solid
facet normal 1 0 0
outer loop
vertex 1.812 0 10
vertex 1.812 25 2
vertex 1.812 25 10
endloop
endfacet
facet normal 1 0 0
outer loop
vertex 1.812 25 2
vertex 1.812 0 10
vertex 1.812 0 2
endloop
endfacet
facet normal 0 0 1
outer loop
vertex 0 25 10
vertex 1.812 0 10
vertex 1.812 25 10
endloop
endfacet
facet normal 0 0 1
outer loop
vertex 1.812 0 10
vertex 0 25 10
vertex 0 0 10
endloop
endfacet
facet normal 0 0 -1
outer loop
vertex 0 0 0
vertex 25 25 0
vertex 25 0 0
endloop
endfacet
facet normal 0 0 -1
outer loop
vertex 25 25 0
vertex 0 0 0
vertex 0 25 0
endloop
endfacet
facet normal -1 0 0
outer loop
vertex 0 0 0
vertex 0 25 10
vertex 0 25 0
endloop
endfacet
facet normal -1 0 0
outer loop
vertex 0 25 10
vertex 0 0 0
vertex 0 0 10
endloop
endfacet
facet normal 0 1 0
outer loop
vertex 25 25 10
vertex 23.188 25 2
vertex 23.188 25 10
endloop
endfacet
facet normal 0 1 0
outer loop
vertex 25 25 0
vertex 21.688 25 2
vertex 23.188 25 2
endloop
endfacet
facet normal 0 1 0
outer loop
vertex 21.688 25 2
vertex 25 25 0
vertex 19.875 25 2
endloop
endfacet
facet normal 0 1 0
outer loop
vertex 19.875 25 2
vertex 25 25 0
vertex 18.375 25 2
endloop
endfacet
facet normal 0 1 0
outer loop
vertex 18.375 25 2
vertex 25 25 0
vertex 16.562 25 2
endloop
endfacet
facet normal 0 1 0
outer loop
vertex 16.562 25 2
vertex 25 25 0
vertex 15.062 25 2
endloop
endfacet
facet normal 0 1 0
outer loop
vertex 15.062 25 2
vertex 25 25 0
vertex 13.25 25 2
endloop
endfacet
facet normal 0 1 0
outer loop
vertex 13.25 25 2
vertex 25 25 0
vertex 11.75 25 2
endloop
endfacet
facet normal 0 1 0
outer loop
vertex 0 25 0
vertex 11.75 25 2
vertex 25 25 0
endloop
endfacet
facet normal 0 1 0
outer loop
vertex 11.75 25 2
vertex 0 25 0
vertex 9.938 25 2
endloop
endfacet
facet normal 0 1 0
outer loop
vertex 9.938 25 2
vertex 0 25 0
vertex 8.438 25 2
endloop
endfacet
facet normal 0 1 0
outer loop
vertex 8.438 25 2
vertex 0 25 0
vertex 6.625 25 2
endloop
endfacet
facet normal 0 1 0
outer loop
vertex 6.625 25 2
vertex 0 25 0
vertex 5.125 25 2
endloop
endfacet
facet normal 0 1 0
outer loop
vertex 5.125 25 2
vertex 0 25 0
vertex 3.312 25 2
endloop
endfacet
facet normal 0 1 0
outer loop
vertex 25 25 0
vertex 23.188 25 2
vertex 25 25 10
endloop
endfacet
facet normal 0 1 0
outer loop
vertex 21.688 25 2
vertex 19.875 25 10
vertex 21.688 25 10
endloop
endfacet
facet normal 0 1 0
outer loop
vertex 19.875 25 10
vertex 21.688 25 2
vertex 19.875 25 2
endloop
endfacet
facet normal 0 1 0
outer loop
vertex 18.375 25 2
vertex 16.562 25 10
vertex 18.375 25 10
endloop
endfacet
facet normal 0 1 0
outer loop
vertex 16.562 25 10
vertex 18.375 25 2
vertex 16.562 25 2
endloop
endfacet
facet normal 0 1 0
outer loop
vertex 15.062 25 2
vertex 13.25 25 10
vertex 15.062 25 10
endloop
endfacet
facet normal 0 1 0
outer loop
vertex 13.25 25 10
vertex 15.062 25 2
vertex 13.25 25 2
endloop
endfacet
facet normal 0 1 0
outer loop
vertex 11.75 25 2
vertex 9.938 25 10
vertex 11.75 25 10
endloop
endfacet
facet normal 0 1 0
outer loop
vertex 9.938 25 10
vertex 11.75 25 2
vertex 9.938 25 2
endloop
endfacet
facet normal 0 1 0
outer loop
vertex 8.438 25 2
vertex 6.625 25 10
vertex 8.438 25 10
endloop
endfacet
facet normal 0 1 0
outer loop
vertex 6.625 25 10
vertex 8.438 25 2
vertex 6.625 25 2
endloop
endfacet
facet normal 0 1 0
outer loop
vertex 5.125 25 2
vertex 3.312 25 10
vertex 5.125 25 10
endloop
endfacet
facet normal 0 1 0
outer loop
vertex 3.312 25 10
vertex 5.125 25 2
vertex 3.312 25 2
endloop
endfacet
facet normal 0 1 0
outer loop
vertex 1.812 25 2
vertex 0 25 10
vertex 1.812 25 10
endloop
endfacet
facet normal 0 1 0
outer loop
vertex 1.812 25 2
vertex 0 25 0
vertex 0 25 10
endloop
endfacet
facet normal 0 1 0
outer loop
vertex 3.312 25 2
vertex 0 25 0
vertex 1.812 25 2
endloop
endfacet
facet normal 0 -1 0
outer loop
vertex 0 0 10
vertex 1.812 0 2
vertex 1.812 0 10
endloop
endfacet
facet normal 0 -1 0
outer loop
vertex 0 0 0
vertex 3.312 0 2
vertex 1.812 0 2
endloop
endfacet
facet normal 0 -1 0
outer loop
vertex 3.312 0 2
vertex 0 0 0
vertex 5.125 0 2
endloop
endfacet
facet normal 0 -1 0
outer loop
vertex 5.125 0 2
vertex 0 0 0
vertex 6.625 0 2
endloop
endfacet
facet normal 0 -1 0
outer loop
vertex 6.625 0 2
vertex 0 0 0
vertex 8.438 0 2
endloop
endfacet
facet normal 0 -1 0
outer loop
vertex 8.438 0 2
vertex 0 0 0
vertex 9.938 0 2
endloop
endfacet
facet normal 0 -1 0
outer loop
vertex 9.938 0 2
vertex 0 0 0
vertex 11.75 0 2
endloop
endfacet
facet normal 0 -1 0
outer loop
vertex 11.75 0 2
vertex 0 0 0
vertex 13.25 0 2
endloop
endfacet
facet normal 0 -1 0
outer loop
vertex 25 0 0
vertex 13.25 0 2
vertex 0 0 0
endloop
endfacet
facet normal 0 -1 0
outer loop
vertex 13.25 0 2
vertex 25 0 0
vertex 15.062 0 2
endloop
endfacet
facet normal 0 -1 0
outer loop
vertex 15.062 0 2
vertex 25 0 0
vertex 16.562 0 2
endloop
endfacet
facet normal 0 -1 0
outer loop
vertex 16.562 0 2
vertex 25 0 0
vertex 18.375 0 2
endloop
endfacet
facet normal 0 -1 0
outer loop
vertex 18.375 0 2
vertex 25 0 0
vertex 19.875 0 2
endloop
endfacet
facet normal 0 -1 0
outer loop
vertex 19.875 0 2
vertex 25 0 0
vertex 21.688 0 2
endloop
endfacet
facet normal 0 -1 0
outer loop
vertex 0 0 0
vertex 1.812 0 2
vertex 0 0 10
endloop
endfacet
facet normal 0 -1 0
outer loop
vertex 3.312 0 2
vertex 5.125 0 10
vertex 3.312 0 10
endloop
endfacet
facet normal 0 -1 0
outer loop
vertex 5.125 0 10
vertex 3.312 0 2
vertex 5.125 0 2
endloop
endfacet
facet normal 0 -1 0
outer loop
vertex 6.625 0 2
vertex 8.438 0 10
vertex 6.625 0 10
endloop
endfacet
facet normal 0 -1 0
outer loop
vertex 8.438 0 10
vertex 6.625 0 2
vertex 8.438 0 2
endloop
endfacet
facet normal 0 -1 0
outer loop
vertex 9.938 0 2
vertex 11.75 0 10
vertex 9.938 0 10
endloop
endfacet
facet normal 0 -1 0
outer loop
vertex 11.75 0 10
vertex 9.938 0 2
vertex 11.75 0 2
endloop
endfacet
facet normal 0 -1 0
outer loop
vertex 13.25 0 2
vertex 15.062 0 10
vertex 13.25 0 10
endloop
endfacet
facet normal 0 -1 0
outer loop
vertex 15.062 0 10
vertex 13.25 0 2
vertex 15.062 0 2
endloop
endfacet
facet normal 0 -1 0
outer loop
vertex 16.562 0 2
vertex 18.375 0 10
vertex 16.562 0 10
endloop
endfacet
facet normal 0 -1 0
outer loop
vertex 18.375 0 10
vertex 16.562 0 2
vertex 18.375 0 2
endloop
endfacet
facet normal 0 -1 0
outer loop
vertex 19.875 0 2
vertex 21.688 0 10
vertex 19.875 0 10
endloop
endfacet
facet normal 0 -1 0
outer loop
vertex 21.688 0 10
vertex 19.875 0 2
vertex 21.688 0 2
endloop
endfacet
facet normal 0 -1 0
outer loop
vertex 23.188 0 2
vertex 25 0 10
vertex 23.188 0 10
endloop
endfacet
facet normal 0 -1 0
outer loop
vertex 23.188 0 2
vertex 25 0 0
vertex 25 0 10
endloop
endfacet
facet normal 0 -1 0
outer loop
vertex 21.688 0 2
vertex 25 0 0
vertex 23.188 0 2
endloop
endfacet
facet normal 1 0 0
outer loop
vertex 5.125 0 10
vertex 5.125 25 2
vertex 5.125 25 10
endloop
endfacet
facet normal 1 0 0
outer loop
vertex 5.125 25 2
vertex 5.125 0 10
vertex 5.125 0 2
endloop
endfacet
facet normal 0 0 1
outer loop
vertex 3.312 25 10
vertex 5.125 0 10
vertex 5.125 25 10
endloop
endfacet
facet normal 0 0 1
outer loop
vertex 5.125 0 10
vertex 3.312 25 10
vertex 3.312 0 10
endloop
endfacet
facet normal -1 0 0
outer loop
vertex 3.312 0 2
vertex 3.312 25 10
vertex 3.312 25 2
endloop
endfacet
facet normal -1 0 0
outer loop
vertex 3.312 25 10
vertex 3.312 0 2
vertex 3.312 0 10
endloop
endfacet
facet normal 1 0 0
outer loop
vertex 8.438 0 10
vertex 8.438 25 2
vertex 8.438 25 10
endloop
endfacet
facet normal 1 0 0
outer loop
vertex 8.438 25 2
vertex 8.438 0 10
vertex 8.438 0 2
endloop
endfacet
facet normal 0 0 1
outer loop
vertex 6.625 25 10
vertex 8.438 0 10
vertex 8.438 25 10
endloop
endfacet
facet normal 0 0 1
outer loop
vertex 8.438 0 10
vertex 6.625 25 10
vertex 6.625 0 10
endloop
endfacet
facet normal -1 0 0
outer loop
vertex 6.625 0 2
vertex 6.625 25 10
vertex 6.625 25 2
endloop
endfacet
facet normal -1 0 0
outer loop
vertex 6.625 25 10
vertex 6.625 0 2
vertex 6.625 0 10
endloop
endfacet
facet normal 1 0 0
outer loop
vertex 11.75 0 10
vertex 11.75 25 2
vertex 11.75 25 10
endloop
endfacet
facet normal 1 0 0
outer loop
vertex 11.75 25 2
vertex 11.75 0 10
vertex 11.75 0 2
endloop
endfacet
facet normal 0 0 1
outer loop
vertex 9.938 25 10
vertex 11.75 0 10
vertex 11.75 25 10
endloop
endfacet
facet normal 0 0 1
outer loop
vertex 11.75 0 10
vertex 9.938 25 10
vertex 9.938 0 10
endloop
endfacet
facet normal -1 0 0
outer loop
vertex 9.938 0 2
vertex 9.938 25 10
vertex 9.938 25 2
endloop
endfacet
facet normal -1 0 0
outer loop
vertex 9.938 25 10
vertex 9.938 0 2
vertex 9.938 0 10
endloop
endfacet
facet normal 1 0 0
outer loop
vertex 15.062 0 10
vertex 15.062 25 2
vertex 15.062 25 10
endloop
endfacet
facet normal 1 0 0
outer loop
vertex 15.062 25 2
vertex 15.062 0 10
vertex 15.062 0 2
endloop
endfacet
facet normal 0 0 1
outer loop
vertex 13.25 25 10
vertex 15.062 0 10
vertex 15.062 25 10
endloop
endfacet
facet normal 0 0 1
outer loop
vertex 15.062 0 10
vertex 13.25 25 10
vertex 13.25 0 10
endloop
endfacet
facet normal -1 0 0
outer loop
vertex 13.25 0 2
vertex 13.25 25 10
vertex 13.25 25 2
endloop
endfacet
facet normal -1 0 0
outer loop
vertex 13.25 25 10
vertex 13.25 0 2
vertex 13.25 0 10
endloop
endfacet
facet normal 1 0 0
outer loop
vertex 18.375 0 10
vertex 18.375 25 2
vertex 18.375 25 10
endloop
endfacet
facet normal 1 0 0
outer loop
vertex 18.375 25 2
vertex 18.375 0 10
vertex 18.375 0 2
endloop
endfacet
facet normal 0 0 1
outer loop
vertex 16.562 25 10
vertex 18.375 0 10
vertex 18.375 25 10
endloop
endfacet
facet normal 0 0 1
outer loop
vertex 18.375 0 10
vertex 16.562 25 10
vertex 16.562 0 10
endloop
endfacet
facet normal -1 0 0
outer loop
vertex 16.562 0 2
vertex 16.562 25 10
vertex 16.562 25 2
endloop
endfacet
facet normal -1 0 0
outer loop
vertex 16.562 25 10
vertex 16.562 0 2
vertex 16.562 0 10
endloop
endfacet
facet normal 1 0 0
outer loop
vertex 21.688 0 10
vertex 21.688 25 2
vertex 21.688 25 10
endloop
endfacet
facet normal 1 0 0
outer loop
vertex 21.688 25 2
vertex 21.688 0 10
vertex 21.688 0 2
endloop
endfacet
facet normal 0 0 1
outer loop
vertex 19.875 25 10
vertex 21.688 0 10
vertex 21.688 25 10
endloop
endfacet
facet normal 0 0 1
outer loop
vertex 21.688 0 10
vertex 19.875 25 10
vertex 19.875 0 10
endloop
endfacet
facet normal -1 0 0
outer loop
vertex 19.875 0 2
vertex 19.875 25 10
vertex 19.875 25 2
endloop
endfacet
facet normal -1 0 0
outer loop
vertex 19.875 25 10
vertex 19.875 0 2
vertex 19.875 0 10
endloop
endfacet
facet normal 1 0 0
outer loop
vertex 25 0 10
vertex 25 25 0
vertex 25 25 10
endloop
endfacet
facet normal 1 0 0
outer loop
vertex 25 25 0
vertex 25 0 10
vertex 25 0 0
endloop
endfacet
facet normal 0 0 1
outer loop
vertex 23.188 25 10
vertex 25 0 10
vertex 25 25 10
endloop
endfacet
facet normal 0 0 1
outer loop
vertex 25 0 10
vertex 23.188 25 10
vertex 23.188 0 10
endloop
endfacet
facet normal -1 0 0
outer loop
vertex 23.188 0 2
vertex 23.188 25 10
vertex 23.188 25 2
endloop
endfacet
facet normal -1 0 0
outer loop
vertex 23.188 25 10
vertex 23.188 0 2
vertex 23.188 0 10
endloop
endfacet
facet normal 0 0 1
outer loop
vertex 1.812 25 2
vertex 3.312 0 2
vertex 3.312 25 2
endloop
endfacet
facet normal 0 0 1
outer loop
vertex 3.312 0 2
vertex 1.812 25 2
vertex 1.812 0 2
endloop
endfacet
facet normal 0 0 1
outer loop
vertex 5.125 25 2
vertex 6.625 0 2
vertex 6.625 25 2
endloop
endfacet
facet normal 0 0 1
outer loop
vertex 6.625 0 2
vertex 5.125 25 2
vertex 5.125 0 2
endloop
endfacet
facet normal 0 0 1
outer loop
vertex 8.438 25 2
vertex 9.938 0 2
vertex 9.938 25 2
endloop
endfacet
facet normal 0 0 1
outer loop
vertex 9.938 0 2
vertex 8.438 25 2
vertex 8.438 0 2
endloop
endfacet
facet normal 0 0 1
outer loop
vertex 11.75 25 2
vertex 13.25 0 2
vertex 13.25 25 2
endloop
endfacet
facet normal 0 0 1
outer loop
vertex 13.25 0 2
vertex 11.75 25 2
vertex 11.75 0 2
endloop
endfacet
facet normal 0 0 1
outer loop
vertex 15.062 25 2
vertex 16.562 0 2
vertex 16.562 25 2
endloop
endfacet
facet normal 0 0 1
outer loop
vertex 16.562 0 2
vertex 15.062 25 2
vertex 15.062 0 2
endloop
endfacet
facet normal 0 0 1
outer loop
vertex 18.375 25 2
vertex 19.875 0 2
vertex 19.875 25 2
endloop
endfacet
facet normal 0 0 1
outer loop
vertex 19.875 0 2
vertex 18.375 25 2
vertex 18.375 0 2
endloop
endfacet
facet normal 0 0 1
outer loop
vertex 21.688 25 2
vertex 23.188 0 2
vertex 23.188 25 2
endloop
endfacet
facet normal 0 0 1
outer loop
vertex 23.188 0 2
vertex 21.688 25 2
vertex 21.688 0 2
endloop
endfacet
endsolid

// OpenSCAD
// file: ../heat_sink.scad
// Parametric straight-fin heat sink: a base plate with evenly spaced rectangular fins standing on
// it. The fins run along y; x is across them. MIT licence; see LICENSE.

/* [Heat sink] */

// Along the fins, mm
length = 40;

// Across the fins, mm
width = 40;

// Overall, base plate included, mm
height = 20;

// Thickness of the base plate, mm
base_height = 3.2;

// Gap between neighbouring fins, mm
gap_width = 2.2;

// Number of fins
num_fins = 11;

/* [Hidden] */

// Width of each fin: what is left of the width once the gaps are taken out, shared evenly.
function heat_sink_fin_width(width, gap_width, num_fins) = (width - gap_width * (num_fins - 1)) / num_fins;

// A heat sink with its base plate on z = 0, from the origin: width along x, length along y.
module heat_sink(length, width, height, base_height, gap_width, num_fins) {
    fin = heat_sink_fin_width(width, gap_width, num_fins);
    assert(length > 0 && width > 0, "heat_sink: length and width have to be more than 0");
    assert(base_height > 0 && height > base_height, "heat_sink: height has to be more than base_height, and base_height more than 0");
    assert(num_fins >= 1 && num_fins == floor(num_fins), str("heat_sink: num_fins has to be a whole number, 1 or more, not ", num_fins));
    assert(gap_width >= 0, "heat_sink: gap_width can't be negative");
    assert(fin > 0, str("heat_sink: ", num_fins, " fins with ", gap_width, " mm gaps leave no room for the fins in ", width, " mm"));
    echo(fin_width=fin);

    cube([width, length, base_height]);
    for (i = [0:num_fins - 1])
        translate([i * (fin + gap_width), 0, 0])
            cube([fin, length, height]);
}

heat_sink(length, width, height, base_height, gap_width, num_fins);
// main file
// A 25 mm square heat sink, 10 mm tall, built from another file.
use <../heat_sink.scad>

heat_sink(length=25, width=25, height=10, base_height=2, gap_width=1.5, num_fins=8);
